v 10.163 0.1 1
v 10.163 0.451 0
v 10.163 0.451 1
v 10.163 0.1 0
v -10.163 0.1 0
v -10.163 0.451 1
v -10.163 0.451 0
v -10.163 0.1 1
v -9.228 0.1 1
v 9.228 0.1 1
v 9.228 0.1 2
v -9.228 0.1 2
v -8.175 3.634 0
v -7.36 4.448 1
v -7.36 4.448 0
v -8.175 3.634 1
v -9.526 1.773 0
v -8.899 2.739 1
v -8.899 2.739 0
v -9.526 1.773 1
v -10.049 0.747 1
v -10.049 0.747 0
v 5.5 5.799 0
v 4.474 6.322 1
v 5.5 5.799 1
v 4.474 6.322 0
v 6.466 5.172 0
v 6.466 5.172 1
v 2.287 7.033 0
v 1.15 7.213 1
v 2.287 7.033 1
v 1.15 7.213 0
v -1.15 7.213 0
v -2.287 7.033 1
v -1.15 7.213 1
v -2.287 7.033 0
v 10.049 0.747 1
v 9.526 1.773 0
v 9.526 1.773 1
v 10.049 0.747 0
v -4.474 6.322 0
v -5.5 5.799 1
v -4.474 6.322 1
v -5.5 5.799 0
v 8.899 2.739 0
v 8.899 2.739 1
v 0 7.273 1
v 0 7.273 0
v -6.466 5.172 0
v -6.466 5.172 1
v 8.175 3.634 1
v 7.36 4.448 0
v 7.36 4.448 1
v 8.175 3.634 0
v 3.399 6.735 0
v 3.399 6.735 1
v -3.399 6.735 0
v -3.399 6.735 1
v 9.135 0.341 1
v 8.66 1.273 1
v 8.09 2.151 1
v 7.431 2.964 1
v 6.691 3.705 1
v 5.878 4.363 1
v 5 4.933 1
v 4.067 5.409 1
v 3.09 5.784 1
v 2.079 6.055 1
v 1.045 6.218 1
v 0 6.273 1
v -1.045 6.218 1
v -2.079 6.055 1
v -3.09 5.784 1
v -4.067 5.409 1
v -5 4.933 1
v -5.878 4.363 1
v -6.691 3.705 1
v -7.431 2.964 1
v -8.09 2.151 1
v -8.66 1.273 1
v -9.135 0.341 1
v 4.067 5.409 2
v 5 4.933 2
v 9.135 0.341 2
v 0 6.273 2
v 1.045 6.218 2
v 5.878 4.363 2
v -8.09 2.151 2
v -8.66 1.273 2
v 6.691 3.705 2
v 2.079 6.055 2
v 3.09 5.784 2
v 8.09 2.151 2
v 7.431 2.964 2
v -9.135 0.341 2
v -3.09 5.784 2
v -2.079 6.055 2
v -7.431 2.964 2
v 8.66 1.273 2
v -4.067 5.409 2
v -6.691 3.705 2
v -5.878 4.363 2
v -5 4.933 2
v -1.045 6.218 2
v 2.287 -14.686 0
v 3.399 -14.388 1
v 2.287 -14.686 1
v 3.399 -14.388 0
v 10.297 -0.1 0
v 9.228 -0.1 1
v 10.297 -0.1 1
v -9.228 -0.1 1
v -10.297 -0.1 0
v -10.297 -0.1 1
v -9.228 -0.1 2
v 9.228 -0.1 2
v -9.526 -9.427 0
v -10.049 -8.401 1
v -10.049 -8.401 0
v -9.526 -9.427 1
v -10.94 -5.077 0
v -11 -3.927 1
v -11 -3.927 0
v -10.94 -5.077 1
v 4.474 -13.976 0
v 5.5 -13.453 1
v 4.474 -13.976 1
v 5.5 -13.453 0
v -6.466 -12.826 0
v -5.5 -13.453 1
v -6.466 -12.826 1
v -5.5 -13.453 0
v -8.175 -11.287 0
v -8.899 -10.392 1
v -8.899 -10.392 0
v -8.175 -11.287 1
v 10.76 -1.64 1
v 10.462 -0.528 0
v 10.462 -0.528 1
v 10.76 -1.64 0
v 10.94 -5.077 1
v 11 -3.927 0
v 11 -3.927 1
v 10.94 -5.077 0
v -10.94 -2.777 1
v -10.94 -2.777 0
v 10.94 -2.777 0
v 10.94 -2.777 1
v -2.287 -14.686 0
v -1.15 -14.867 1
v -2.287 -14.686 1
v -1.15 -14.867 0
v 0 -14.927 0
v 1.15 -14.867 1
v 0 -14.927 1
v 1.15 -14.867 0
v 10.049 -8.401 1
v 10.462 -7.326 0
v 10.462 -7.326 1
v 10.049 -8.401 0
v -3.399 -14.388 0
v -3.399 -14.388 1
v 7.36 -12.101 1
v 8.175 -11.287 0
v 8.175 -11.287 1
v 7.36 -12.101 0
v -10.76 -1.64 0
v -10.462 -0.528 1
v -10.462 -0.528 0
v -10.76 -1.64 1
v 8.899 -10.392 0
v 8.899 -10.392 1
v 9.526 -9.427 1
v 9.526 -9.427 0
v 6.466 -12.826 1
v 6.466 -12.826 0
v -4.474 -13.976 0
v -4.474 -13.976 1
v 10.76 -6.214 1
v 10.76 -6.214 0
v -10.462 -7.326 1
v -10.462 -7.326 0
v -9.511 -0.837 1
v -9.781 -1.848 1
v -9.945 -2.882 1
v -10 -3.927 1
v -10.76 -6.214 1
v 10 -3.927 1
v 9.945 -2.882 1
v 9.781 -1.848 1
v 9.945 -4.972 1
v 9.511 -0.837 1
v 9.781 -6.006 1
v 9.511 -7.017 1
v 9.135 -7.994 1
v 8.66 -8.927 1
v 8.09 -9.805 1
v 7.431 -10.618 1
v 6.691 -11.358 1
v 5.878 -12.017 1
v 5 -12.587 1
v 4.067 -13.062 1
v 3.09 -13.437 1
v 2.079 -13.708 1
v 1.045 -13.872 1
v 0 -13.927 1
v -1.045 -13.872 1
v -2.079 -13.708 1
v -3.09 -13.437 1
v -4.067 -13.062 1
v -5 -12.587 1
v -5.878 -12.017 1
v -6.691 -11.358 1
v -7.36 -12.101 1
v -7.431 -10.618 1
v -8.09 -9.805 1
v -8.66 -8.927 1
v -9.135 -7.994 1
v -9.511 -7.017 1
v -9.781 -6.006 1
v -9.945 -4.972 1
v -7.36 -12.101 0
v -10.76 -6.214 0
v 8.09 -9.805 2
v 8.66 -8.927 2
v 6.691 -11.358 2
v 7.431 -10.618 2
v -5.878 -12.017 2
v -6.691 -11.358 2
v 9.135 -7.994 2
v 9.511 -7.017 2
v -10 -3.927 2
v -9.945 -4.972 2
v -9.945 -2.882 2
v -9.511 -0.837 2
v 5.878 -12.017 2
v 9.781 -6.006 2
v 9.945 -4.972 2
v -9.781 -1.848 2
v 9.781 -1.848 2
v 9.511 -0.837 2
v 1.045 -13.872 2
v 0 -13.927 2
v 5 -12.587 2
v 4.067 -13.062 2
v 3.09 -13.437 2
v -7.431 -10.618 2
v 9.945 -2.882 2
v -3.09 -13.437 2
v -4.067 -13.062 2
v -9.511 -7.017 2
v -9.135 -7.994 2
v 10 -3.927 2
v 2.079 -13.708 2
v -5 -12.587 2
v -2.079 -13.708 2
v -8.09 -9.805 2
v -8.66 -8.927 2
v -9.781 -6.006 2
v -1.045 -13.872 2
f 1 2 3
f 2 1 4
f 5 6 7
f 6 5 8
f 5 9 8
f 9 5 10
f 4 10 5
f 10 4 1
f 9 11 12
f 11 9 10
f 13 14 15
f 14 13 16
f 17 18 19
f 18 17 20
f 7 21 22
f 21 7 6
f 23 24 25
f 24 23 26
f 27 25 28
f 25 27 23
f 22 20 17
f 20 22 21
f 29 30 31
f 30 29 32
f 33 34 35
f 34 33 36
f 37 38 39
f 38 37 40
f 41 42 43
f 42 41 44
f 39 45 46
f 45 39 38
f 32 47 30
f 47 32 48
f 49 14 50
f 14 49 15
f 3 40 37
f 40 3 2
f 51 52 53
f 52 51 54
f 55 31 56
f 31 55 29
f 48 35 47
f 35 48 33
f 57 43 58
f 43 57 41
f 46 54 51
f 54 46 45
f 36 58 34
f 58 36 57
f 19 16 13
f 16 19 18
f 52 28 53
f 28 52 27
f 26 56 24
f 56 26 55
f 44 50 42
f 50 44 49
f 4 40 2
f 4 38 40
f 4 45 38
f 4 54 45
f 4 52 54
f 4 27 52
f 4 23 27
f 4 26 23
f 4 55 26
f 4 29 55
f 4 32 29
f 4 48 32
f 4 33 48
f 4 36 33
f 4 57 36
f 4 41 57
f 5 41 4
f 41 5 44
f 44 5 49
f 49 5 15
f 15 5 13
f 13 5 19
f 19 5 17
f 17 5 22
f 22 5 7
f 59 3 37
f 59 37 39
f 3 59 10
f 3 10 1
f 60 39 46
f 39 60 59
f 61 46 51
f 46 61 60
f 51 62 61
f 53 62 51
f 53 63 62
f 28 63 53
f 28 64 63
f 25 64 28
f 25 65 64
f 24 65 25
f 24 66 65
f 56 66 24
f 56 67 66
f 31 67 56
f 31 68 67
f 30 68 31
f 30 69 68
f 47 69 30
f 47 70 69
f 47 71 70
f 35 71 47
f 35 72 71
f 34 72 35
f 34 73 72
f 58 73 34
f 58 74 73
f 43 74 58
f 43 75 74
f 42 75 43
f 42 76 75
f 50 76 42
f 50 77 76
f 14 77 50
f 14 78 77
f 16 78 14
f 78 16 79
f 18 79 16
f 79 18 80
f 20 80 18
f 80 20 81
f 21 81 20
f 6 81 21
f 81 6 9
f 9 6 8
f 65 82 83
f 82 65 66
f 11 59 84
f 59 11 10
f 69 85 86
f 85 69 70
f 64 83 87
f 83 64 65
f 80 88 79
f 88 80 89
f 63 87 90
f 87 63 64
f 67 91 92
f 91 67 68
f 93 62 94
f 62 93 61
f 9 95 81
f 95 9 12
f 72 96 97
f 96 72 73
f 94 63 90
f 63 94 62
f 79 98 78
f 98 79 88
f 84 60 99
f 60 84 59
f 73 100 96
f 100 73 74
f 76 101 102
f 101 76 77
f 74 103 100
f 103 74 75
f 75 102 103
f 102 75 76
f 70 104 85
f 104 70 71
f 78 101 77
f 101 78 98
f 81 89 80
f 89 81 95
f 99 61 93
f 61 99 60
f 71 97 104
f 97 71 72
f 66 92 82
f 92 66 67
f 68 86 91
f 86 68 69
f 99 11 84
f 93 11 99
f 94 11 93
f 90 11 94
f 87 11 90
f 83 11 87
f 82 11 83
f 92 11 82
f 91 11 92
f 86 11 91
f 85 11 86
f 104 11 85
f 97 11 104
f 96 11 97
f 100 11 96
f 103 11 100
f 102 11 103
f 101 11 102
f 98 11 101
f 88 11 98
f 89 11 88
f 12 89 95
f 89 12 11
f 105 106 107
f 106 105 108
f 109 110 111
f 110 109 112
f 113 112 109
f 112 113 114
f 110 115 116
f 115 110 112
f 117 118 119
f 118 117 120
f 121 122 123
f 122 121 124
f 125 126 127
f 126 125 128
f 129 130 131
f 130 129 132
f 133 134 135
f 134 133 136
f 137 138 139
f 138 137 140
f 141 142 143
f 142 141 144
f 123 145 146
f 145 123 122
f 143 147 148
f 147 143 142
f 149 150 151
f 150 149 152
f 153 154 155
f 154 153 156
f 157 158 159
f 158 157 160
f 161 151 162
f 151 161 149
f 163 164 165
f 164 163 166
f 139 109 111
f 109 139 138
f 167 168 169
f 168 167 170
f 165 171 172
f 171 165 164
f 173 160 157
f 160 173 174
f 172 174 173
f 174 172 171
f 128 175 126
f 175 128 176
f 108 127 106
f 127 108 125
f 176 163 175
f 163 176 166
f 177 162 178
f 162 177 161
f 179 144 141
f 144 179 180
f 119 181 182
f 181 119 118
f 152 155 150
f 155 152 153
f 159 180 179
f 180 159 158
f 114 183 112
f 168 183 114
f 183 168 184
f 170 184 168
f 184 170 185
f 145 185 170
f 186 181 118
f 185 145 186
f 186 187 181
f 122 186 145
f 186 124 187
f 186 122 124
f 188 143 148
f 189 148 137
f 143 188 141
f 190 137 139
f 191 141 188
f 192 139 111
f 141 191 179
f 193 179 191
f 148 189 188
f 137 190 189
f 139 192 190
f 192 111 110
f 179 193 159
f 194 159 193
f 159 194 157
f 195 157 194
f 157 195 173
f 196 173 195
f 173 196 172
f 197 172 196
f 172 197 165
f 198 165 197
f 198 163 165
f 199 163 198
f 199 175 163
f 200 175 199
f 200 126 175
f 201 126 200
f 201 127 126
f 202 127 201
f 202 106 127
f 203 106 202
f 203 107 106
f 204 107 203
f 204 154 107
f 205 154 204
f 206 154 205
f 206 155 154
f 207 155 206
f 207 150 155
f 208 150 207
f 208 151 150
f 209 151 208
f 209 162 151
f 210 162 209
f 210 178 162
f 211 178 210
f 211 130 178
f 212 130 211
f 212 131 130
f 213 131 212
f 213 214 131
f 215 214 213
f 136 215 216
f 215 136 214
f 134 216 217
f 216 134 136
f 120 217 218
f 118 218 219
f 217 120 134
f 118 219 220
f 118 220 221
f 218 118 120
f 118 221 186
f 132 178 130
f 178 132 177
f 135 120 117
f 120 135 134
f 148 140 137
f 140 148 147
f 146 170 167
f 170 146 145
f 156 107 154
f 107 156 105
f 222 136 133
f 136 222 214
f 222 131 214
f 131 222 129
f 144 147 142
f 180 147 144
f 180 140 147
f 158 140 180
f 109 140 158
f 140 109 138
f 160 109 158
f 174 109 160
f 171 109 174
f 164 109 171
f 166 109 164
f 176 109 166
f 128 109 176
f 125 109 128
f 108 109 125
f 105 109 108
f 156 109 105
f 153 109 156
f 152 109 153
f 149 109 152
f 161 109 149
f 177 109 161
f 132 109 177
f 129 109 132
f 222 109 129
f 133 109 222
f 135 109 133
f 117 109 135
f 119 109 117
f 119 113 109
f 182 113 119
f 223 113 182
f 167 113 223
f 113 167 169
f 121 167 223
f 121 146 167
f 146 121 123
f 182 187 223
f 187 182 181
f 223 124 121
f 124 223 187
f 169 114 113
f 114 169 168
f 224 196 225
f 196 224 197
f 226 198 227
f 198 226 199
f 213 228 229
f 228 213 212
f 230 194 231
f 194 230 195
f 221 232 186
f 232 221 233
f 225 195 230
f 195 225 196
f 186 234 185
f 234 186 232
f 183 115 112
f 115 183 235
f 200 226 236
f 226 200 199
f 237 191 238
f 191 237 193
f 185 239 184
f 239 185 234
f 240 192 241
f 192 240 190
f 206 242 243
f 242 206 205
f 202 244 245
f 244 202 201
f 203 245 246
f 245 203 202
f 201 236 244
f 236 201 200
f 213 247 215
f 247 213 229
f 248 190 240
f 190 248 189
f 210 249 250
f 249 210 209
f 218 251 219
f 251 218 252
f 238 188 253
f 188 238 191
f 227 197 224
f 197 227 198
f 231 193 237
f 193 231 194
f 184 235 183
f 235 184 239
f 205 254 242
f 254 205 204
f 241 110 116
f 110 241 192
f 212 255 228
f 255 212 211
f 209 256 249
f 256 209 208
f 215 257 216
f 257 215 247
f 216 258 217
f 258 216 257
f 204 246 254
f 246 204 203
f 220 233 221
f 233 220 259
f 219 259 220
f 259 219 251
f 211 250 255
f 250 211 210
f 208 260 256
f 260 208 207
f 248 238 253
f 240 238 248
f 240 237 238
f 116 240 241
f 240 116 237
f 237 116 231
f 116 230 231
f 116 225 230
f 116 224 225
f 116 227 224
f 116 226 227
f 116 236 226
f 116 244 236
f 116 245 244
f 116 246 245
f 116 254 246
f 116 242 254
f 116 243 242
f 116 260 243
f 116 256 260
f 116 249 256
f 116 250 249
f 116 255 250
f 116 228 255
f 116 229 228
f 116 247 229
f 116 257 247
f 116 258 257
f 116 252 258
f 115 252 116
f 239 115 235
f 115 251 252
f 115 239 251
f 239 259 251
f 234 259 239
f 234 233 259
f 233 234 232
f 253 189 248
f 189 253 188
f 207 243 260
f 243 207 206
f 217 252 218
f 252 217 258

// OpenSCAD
// Unit of length: Unit.MM
$fn = 60;
$vpr = [0.0, 0.0, 0.0];

union()
{
   translate(v = [0.0, 0.1])
   {
      union()
      {
         color(c = [1.0, 0.0, 0.0, 1.0])
         {
            linear_extrude(height = 1.0, center = false, twist = 0.0, scale = 1.0)
            {
               translate(v = [0.0, -3.8268])
               {
                  intersection()
                  {
                     circle(d = 22.0);
                     polygon(points = [[-10.1627, 3.8268], [-10.1627, 11.0], [10.1627, 11.0], [10.1627, 3.8268]]);
                  }
               }
            }
         }
         translate(v = [0.0, 0.0, 0.0])
         {
            linear_extrude(height = 2.0, center = false, twist = 0.0, scale = 1.0)
            {
               translate(v = [0.0, -3.8268])
               {
                  intersection()
                  {
                     circle(d = 20.0);
                     polygon(points = [[-9.2388, 3.8268], [-9.2388, 10.0], [9.2388, 10.0], [9.2388, 3.8268]]);
                  }
               }
            }
         }
      }
   }
   translate(v = [0.0, -0.1])
   {
      union()
      {
         color(c = [1.0, 0.0, 0.0, 1.0])
         {
            linear_extrude(height = 1.0, center = false, twist = 0.0, scale = 1.0)
            {
               translate(v = [0.0, -3.8268])
               {
                  intersection()
                  {
                     circle(d = 22.0);
                     polygon(points = [[-11.0, -11.0], [-11.0, 3.8268], [11.0, 3.8268], [11.0, -11.0]]);
                  }
               }
            }
         }
         translate(v = [0.0, 0.0, 0.0])
         {
            linear_extrude(height = 2.0, center = false, twist = 0.0, scale = 1.0)
            {
               translate(v = [0.0, -3.8268])
               {
                  intersection()
                  {
                     circle(d = 20.0);
                     polygon(points = [[-10.0, -10.0], [-10.0, 3.8268], [10.0, 3.8268], [10.0, -10.0]]);
                  }
               }
            }
         }
      }
   }
}
